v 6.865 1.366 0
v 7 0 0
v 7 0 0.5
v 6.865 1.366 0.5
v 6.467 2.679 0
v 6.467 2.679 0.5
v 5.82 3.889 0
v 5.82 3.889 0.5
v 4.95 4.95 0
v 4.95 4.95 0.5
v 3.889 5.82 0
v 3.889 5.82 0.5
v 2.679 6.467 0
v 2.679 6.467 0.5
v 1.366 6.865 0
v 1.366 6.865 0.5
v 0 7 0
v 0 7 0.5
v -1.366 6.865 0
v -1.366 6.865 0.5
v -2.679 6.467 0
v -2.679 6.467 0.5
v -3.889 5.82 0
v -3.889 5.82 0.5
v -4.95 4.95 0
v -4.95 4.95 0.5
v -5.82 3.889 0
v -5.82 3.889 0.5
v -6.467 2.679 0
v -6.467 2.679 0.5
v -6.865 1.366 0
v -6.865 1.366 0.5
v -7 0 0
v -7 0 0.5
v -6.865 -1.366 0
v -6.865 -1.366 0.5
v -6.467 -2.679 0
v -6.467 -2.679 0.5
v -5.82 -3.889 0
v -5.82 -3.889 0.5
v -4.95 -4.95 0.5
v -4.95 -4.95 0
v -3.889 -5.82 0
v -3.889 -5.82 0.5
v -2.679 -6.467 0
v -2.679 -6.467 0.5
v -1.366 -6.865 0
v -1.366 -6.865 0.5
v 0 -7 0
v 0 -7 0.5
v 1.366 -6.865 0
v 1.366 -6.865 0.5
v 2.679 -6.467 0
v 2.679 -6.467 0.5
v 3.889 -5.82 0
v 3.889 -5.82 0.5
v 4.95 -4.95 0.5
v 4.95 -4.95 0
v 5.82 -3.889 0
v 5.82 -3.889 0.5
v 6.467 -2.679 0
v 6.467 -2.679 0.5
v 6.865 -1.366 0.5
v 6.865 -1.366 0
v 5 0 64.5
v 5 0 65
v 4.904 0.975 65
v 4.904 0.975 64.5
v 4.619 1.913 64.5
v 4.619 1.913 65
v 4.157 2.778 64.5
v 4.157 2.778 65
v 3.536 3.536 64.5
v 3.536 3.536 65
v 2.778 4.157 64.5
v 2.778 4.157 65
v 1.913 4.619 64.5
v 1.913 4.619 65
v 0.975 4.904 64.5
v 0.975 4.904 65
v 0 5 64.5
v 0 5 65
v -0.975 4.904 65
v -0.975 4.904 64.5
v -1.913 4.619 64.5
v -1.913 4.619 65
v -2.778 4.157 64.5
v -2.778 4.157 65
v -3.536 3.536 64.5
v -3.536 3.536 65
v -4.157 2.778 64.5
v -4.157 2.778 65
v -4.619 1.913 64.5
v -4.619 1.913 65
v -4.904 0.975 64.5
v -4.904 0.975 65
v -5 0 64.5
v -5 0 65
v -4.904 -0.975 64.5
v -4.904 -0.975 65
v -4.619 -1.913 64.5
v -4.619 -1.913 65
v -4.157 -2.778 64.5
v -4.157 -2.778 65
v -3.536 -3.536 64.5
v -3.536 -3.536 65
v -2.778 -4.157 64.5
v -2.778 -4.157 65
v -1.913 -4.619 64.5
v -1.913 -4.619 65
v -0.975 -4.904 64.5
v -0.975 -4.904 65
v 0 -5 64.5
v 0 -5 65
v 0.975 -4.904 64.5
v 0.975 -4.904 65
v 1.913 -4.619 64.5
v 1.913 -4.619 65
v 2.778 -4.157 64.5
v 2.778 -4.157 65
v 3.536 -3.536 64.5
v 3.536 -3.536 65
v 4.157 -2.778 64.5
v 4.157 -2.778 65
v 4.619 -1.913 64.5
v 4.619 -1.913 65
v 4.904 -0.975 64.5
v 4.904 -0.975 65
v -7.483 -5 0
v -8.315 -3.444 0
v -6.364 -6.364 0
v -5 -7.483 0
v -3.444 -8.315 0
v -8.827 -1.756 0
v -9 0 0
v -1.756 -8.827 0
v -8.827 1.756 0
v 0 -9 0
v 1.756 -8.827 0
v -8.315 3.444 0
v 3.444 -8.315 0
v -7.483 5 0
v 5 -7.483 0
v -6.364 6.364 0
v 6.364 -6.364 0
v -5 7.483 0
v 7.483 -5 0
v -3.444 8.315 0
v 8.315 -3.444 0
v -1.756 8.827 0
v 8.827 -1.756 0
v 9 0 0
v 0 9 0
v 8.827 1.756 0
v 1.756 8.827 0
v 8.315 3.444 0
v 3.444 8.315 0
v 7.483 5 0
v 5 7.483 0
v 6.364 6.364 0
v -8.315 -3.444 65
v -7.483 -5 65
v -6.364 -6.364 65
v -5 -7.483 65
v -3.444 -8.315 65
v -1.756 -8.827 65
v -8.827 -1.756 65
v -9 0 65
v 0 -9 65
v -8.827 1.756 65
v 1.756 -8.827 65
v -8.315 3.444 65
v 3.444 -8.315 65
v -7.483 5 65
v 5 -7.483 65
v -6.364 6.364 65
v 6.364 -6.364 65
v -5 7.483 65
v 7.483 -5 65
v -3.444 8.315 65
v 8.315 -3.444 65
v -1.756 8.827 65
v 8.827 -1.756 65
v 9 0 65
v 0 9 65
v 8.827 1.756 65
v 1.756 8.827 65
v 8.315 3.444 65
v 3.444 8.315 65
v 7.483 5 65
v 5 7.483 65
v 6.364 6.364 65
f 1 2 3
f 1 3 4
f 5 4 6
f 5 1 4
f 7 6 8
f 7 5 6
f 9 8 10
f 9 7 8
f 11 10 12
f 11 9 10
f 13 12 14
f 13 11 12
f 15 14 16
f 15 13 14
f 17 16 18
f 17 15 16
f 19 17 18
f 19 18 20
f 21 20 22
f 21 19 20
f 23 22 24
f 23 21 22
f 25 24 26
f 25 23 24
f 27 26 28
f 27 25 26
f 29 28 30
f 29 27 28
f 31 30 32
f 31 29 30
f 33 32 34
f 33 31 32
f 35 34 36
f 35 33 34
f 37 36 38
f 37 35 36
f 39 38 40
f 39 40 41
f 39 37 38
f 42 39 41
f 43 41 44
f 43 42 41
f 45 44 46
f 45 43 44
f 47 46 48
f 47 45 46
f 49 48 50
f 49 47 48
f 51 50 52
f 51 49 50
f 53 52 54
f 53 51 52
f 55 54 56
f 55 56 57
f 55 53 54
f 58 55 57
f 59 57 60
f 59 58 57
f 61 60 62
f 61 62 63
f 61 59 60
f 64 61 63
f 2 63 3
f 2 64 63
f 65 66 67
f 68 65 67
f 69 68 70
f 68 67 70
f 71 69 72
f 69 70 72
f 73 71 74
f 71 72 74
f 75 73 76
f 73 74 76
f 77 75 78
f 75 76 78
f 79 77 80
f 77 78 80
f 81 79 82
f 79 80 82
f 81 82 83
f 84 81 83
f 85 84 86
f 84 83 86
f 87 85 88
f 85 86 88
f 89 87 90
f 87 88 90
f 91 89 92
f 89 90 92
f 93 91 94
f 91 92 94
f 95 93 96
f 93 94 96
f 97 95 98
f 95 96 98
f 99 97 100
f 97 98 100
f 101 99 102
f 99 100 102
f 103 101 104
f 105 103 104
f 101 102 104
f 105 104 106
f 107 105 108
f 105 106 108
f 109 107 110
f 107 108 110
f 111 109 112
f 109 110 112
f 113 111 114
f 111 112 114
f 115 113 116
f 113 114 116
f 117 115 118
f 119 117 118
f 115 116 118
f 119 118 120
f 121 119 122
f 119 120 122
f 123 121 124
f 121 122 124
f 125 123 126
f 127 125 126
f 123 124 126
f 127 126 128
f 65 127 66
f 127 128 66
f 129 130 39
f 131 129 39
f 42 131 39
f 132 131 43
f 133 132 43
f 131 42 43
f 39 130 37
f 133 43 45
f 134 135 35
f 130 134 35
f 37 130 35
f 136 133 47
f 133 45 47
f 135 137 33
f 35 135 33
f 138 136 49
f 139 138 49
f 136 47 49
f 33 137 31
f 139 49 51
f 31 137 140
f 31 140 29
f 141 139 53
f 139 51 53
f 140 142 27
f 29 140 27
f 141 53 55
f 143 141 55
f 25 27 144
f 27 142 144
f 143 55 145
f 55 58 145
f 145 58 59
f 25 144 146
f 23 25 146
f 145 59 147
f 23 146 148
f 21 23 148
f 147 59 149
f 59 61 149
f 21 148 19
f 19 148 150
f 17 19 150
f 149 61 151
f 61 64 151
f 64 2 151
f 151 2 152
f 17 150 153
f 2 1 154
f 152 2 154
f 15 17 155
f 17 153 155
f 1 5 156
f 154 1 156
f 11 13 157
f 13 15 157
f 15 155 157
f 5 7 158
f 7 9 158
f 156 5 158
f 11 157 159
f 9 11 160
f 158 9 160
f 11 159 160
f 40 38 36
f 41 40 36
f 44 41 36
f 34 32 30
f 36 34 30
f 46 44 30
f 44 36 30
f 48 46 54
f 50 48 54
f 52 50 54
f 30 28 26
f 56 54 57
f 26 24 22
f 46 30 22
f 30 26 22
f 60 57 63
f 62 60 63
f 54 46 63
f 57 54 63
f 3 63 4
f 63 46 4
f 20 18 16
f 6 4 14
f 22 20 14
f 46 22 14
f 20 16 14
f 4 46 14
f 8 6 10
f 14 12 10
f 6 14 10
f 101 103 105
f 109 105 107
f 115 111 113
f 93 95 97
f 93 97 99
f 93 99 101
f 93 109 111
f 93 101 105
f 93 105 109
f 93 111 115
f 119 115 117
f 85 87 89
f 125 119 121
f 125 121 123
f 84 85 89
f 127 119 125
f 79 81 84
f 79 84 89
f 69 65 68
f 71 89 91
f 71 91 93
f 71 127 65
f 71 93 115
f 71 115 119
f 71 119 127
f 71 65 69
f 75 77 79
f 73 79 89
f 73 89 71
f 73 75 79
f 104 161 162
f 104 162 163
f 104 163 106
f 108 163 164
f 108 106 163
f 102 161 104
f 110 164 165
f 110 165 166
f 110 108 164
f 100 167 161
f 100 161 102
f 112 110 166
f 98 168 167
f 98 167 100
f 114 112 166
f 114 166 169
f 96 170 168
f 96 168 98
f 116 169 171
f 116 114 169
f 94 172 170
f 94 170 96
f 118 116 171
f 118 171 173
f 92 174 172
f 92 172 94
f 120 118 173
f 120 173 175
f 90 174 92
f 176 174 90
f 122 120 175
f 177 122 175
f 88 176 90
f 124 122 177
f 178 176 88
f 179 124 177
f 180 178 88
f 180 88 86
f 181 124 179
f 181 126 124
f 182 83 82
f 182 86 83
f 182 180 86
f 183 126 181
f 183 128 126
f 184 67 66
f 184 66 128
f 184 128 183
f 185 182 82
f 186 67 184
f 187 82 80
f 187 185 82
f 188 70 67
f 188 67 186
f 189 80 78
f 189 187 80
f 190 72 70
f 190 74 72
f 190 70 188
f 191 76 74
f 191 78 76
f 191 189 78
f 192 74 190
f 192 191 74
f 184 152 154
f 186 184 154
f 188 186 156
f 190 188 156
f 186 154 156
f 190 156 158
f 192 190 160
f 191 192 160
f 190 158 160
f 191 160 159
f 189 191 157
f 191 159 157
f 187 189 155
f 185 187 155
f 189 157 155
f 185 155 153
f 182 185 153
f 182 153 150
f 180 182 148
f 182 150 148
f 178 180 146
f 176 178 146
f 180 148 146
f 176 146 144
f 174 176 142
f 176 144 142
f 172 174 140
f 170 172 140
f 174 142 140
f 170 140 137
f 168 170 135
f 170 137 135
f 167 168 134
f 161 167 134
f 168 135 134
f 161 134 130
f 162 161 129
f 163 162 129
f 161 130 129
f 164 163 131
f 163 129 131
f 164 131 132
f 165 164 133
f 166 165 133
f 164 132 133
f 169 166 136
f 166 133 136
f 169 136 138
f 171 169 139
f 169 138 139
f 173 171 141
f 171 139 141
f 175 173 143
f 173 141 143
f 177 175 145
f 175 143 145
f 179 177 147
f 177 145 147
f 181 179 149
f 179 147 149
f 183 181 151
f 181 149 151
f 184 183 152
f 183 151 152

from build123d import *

# Parameters (mm, degrees)
SKETCH1_R           = 9
BOSS_EXTRUDE1_DEPTH = 65
SKETCH2_R           = 7
CUT_EXTRUDE1_DEPTH  = 0.5
SKETCH3_R           = 5
CUT_EXTRUDE3_DEPTH  = 0.5


with BuildPart() as part:
    # Sketch1 → Boss-Extrude1 (new body)
    with BuildSketch(Plane.XY):
        Circle(SKETCH1_R)
    extrude(amount=BOSS_EXTRUDE1_DEPTH)

    # Sketch2 → Cut-Extrude1 (cut)
    with BuildSketch(Plane.XY):
        Circle(SKETCH2_R)
    extrude(amount=CUT_EXTRUDE1_DEPTH, mode=Mode.SUBTRACT)

    # Sketch3 → Cut-Extrude3 (cut)
    with BuildSketch(Plane.XY.offset(65)):
        Circle(SKETCH3_R)
    extrude(amount=-CUT_EXTRUDE3_DEPTH, mode=Mode.SUBTRACT)


solid = part.part
